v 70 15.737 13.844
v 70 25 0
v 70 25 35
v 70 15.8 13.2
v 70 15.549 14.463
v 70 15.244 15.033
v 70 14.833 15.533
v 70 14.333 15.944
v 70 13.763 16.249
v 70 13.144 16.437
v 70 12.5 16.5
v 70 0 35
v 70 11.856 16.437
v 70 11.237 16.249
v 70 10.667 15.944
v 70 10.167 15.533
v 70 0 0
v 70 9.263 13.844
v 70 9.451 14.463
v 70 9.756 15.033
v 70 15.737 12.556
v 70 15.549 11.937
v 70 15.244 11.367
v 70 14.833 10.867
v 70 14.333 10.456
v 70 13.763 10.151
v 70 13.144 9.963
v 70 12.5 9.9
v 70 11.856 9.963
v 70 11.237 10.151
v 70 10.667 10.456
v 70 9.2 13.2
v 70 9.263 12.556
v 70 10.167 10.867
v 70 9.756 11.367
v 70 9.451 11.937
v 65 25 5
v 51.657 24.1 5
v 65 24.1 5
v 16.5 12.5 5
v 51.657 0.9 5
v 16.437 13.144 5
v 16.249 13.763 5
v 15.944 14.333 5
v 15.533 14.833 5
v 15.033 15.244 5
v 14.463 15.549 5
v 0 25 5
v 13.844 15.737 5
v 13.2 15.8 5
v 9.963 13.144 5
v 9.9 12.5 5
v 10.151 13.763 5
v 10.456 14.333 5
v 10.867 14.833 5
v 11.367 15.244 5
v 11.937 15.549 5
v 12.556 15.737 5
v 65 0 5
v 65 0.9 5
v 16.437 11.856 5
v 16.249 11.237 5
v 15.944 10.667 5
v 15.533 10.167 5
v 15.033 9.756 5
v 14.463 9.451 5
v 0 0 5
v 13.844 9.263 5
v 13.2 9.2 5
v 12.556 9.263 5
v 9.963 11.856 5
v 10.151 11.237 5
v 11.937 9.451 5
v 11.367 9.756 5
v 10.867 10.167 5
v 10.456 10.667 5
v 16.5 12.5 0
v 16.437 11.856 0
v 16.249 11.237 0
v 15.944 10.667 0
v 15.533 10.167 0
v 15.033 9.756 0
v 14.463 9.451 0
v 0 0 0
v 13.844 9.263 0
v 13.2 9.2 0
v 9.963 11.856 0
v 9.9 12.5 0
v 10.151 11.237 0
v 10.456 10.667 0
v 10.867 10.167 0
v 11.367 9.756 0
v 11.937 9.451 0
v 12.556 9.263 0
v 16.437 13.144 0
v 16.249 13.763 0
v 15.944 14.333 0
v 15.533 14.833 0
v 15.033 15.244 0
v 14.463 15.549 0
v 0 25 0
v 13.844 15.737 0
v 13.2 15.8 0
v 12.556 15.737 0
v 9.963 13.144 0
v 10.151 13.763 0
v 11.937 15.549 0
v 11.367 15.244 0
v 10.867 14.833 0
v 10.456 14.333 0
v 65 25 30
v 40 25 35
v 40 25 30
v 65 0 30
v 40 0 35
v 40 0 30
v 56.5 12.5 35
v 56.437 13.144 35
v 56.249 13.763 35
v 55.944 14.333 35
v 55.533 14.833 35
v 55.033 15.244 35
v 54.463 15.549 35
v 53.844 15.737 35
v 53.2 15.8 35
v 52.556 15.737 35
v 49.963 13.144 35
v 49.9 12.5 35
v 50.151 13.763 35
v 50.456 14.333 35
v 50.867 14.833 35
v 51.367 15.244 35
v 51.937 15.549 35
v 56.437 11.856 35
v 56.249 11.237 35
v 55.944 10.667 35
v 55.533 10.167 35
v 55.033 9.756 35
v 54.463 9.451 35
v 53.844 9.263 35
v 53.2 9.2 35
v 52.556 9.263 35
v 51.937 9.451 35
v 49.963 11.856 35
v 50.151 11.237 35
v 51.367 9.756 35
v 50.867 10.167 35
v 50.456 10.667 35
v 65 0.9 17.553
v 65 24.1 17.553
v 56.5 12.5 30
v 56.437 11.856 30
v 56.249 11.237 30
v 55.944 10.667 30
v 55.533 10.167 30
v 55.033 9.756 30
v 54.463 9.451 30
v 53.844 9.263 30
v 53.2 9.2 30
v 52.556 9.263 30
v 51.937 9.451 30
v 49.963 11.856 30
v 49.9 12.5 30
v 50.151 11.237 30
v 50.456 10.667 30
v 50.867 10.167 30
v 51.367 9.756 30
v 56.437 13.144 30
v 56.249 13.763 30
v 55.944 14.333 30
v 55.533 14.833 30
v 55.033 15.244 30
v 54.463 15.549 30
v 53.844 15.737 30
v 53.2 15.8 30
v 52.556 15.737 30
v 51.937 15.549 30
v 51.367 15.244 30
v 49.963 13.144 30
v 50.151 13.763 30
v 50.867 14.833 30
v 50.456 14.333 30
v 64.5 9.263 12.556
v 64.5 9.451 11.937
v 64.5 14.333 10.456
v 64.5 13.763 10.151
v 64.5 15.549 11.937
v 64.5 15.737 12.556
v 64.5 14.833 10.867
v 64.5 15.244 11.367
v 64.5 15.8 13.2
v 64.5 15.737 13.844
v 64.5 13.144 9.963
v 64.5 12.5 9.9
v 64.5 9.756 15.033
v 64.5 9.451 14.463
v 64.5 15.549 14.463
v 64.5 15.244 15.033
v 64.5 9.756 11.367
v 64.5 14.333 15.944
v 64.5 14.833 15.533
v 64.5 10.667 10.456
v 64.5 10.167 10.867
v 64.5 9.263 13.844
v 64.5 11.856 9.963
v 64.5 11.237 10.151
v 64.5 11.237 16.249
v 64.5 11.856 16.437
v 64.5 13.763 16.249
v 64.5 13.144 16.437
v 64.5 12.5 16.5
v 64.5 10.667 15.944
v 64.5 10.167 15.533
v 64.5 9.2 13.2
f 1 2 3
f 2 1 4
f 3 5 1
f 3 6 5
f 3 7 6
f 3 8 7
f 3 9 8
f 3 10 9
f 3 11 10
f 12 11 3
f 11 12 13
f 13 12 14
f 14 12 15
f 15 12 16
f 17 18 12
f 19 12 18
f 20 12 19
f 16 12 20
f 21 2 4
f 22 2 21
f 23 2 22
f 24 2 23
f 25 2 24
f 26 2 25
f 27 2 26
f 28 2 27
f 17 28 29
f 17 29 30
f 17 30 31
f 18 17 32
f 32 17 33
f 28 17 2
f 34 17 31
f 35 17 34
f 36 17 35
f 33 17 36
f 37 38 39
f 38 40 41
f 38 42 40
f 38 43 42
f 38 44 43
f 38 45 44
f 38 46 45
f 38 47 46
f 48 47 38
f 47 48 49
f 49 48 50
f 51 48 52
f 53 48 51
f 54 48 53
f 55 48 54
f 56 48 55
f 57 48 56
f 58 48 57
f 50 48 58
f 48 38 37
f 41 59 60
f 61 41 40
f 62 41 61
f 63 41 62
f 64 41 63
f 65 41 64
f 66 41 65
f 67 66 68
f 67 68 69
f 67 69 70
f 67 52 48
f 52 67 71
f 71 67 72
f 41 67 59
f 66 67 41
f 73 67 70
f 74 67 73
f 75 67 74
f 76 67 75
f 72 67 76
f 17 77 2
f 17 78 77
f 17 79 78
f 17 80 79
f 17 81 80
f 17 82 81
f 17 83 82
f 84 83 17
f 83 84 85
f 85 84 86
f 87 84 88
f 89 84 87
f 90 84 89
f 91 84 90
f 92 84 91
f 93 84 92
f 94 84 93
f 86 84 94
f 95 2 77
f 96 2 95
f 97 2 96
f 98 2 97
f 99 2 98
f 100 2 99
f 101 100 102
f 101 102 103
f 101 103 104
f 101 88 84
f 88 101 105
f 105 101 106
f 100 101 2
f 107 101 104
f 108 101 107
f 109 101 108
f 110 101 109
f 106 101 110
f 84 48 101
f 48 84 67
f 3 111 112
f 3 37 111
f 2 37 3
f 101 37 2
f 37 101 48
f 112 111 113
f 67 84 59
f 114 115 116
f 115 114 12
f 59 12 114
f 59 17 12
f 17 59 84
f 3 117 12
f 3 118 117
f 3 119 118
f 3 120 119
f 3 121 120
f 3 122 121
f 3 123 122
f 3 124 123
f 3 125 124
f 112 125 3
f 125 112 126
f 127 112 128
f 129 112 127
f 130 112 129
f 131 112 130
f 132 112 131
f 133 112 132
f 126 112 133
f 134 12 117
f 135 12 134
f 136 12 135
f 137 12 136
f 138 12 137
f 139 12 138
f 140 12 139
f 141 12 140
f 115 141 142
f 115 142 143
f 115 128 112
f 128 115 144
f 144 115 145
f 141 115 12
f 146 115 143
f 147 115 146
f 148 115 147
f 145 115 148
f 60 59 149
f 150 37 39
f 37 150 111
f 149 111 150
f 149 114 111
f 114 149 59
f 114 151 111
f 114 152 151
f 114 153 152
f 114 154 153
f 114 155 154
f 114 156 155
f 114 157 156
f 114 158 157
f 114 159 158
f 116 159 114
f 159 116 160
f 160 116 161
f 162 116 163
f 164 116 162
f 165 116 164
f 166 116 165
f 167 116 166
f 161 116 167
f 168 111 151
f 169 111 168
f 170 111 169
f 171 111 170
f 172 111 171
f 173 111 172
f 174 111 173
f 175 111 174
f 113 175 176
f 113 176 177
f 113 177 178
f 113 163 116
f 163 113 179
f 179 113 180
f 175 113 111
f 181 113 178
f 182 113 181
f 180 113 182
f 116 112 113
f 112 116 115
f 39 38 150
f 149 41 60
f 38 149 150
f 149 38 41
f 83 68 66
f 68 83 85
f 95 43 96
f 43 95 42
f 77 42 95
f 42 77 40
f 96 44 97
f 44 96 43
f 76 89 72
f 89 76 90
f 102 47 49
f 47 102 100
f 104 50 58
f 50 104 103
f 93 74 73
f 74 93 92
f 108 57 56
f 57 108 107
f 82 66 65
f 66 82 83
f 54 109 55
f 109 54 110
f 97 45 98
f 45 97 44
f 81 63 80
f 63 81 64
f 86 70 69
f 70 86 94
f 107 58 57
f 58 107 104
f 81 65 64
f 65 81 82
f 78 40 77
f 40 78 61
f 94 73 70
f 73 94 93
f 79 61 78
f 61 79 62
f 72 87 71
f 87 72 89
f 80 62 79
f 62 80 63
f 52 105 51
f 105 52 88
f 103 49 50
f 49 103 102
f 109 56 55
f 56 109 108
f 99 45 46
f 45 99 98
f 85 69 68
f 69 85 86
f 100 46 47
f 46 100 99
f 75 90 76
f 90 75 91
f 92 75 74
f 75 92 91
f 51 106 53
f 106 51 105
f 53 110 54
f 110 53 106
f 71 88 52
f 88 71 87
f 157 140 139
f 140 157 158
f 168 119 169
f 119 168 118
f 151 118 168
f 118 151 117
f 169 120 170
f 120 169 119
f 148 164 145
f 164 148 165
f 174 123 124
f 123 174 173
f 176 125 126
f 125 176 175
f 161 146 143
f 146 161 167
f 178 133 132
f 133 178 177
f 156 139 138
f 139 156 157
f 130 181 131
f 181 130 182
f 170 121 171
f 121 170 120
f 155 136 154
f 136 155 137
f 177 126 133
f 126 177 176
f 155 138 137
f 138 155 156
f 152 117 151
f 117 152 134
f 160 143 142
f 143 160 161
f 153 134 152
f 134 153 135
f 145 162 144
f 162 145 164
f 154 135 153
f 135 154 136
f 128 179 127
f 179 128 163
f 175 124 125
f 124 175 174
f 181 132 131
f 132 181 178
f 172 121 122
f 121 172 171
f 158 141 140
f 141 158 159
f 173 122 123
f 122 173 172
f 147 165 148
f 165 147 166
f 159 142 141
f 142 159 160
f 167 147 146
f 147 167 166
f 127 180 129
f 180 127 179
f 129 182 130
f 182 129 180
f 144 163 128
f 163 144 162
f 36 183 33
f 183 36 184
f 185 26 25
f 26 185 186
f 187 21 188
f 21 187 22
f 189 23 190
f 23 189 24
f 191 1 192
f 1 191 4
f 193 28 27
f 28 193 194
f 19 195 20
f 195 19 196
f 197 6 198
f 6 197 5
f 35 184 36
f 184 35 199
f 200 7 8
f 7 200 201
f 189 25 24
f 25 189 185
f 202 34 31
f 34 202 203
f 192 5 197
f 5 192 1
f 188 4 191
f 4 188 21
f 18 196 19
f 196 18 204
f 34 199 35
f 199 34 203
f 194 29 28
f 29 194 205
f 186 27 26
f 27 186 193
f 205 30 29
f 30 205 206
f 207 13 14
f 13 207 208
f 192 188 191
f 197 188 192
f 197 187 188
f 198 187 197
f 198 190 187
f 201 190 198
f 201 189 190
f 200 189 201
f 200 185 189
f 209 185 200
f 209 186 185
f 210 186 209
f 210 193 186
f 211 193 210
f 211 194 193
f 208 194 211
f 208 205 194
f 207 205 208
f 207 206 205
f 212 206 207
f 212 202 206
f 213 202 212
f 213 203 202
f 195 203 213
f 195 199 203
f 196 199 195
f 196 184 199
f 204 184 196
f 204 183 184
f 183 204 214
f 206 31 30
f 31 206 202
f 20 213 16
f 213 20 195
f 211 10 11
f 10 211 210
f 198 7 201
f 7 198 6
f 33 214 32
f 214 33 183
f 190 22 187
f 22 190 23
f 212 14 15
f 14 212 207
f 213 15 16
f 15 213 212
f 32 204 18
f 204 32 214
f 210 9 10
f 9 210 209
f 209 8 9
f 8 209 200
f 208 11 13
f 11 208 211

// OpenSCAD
$fn = 32;

// ----------------------------------------------------------------------
// Z-bracket: 70 x 25 x 35 mm
// ----------------------------------------------------------------------

// --- parameters (mm) ---
foot_len = 70;            // lower foot length, X
top_len = 25;             // upper foot length, X
depth = 25;               // bracket width, Y
step_h = 35;              // overall rise, Z
plate_t = 5;              // plate thickness
hole_d = 6.6;             // clearance for M6
rib_len = 14.3;           // gusset leg
rib_sink = 0.9;           // gusset overlap into the plates

module hole_z(px, py, z0) {
  translate([px, py, z0 - 0.5]) cylinder(h = plate_t + 1, d = hole_d);
}
module hole_x(py, pz) {
  translate([-0.5, py, pz]) rotate([0, 90, 0]) cylinder(h = plate_t + 1, d = hole_d);
}
module gusset(x0) {
  translate([x0, depth - rib_sink, 0])
    rotate([90, 0, 0])
      linear_extrude(height = depth - 2 * rib_sink)
        polygon(points = [[rib_sink, plate_t - rib_sink],
                          [rib_sink, plate_t - rib_sink + rib_len],
                          [-rib_len, plate_t - rib_sink]]);
}

difference() {
  union() {
    cube([foot_len, depth, plate_t]);
    /* web, overlapping the lower foot */
    translate([foot_len - plate_t, 0, 0]) cube([plate_t, depth, step_h]);
    /* upper foot, sunk into the web */
    translate([foot_len - plate_t - top_len, 0, step_h - plate_t]) cube([top_len + plate_t, depth, plate_t]);
    gusset(foot_len - plate_t);
  }
  hole_z(13.2, 12.5, 0);
  translate([foot_len - plate_t - 11.8, 0, 0]) hole_z(0, 12.5, step_h - plate_t);
  translate([foot_len - plate_t, 0, 0]) hole_x(12.5, 13.2);
}
